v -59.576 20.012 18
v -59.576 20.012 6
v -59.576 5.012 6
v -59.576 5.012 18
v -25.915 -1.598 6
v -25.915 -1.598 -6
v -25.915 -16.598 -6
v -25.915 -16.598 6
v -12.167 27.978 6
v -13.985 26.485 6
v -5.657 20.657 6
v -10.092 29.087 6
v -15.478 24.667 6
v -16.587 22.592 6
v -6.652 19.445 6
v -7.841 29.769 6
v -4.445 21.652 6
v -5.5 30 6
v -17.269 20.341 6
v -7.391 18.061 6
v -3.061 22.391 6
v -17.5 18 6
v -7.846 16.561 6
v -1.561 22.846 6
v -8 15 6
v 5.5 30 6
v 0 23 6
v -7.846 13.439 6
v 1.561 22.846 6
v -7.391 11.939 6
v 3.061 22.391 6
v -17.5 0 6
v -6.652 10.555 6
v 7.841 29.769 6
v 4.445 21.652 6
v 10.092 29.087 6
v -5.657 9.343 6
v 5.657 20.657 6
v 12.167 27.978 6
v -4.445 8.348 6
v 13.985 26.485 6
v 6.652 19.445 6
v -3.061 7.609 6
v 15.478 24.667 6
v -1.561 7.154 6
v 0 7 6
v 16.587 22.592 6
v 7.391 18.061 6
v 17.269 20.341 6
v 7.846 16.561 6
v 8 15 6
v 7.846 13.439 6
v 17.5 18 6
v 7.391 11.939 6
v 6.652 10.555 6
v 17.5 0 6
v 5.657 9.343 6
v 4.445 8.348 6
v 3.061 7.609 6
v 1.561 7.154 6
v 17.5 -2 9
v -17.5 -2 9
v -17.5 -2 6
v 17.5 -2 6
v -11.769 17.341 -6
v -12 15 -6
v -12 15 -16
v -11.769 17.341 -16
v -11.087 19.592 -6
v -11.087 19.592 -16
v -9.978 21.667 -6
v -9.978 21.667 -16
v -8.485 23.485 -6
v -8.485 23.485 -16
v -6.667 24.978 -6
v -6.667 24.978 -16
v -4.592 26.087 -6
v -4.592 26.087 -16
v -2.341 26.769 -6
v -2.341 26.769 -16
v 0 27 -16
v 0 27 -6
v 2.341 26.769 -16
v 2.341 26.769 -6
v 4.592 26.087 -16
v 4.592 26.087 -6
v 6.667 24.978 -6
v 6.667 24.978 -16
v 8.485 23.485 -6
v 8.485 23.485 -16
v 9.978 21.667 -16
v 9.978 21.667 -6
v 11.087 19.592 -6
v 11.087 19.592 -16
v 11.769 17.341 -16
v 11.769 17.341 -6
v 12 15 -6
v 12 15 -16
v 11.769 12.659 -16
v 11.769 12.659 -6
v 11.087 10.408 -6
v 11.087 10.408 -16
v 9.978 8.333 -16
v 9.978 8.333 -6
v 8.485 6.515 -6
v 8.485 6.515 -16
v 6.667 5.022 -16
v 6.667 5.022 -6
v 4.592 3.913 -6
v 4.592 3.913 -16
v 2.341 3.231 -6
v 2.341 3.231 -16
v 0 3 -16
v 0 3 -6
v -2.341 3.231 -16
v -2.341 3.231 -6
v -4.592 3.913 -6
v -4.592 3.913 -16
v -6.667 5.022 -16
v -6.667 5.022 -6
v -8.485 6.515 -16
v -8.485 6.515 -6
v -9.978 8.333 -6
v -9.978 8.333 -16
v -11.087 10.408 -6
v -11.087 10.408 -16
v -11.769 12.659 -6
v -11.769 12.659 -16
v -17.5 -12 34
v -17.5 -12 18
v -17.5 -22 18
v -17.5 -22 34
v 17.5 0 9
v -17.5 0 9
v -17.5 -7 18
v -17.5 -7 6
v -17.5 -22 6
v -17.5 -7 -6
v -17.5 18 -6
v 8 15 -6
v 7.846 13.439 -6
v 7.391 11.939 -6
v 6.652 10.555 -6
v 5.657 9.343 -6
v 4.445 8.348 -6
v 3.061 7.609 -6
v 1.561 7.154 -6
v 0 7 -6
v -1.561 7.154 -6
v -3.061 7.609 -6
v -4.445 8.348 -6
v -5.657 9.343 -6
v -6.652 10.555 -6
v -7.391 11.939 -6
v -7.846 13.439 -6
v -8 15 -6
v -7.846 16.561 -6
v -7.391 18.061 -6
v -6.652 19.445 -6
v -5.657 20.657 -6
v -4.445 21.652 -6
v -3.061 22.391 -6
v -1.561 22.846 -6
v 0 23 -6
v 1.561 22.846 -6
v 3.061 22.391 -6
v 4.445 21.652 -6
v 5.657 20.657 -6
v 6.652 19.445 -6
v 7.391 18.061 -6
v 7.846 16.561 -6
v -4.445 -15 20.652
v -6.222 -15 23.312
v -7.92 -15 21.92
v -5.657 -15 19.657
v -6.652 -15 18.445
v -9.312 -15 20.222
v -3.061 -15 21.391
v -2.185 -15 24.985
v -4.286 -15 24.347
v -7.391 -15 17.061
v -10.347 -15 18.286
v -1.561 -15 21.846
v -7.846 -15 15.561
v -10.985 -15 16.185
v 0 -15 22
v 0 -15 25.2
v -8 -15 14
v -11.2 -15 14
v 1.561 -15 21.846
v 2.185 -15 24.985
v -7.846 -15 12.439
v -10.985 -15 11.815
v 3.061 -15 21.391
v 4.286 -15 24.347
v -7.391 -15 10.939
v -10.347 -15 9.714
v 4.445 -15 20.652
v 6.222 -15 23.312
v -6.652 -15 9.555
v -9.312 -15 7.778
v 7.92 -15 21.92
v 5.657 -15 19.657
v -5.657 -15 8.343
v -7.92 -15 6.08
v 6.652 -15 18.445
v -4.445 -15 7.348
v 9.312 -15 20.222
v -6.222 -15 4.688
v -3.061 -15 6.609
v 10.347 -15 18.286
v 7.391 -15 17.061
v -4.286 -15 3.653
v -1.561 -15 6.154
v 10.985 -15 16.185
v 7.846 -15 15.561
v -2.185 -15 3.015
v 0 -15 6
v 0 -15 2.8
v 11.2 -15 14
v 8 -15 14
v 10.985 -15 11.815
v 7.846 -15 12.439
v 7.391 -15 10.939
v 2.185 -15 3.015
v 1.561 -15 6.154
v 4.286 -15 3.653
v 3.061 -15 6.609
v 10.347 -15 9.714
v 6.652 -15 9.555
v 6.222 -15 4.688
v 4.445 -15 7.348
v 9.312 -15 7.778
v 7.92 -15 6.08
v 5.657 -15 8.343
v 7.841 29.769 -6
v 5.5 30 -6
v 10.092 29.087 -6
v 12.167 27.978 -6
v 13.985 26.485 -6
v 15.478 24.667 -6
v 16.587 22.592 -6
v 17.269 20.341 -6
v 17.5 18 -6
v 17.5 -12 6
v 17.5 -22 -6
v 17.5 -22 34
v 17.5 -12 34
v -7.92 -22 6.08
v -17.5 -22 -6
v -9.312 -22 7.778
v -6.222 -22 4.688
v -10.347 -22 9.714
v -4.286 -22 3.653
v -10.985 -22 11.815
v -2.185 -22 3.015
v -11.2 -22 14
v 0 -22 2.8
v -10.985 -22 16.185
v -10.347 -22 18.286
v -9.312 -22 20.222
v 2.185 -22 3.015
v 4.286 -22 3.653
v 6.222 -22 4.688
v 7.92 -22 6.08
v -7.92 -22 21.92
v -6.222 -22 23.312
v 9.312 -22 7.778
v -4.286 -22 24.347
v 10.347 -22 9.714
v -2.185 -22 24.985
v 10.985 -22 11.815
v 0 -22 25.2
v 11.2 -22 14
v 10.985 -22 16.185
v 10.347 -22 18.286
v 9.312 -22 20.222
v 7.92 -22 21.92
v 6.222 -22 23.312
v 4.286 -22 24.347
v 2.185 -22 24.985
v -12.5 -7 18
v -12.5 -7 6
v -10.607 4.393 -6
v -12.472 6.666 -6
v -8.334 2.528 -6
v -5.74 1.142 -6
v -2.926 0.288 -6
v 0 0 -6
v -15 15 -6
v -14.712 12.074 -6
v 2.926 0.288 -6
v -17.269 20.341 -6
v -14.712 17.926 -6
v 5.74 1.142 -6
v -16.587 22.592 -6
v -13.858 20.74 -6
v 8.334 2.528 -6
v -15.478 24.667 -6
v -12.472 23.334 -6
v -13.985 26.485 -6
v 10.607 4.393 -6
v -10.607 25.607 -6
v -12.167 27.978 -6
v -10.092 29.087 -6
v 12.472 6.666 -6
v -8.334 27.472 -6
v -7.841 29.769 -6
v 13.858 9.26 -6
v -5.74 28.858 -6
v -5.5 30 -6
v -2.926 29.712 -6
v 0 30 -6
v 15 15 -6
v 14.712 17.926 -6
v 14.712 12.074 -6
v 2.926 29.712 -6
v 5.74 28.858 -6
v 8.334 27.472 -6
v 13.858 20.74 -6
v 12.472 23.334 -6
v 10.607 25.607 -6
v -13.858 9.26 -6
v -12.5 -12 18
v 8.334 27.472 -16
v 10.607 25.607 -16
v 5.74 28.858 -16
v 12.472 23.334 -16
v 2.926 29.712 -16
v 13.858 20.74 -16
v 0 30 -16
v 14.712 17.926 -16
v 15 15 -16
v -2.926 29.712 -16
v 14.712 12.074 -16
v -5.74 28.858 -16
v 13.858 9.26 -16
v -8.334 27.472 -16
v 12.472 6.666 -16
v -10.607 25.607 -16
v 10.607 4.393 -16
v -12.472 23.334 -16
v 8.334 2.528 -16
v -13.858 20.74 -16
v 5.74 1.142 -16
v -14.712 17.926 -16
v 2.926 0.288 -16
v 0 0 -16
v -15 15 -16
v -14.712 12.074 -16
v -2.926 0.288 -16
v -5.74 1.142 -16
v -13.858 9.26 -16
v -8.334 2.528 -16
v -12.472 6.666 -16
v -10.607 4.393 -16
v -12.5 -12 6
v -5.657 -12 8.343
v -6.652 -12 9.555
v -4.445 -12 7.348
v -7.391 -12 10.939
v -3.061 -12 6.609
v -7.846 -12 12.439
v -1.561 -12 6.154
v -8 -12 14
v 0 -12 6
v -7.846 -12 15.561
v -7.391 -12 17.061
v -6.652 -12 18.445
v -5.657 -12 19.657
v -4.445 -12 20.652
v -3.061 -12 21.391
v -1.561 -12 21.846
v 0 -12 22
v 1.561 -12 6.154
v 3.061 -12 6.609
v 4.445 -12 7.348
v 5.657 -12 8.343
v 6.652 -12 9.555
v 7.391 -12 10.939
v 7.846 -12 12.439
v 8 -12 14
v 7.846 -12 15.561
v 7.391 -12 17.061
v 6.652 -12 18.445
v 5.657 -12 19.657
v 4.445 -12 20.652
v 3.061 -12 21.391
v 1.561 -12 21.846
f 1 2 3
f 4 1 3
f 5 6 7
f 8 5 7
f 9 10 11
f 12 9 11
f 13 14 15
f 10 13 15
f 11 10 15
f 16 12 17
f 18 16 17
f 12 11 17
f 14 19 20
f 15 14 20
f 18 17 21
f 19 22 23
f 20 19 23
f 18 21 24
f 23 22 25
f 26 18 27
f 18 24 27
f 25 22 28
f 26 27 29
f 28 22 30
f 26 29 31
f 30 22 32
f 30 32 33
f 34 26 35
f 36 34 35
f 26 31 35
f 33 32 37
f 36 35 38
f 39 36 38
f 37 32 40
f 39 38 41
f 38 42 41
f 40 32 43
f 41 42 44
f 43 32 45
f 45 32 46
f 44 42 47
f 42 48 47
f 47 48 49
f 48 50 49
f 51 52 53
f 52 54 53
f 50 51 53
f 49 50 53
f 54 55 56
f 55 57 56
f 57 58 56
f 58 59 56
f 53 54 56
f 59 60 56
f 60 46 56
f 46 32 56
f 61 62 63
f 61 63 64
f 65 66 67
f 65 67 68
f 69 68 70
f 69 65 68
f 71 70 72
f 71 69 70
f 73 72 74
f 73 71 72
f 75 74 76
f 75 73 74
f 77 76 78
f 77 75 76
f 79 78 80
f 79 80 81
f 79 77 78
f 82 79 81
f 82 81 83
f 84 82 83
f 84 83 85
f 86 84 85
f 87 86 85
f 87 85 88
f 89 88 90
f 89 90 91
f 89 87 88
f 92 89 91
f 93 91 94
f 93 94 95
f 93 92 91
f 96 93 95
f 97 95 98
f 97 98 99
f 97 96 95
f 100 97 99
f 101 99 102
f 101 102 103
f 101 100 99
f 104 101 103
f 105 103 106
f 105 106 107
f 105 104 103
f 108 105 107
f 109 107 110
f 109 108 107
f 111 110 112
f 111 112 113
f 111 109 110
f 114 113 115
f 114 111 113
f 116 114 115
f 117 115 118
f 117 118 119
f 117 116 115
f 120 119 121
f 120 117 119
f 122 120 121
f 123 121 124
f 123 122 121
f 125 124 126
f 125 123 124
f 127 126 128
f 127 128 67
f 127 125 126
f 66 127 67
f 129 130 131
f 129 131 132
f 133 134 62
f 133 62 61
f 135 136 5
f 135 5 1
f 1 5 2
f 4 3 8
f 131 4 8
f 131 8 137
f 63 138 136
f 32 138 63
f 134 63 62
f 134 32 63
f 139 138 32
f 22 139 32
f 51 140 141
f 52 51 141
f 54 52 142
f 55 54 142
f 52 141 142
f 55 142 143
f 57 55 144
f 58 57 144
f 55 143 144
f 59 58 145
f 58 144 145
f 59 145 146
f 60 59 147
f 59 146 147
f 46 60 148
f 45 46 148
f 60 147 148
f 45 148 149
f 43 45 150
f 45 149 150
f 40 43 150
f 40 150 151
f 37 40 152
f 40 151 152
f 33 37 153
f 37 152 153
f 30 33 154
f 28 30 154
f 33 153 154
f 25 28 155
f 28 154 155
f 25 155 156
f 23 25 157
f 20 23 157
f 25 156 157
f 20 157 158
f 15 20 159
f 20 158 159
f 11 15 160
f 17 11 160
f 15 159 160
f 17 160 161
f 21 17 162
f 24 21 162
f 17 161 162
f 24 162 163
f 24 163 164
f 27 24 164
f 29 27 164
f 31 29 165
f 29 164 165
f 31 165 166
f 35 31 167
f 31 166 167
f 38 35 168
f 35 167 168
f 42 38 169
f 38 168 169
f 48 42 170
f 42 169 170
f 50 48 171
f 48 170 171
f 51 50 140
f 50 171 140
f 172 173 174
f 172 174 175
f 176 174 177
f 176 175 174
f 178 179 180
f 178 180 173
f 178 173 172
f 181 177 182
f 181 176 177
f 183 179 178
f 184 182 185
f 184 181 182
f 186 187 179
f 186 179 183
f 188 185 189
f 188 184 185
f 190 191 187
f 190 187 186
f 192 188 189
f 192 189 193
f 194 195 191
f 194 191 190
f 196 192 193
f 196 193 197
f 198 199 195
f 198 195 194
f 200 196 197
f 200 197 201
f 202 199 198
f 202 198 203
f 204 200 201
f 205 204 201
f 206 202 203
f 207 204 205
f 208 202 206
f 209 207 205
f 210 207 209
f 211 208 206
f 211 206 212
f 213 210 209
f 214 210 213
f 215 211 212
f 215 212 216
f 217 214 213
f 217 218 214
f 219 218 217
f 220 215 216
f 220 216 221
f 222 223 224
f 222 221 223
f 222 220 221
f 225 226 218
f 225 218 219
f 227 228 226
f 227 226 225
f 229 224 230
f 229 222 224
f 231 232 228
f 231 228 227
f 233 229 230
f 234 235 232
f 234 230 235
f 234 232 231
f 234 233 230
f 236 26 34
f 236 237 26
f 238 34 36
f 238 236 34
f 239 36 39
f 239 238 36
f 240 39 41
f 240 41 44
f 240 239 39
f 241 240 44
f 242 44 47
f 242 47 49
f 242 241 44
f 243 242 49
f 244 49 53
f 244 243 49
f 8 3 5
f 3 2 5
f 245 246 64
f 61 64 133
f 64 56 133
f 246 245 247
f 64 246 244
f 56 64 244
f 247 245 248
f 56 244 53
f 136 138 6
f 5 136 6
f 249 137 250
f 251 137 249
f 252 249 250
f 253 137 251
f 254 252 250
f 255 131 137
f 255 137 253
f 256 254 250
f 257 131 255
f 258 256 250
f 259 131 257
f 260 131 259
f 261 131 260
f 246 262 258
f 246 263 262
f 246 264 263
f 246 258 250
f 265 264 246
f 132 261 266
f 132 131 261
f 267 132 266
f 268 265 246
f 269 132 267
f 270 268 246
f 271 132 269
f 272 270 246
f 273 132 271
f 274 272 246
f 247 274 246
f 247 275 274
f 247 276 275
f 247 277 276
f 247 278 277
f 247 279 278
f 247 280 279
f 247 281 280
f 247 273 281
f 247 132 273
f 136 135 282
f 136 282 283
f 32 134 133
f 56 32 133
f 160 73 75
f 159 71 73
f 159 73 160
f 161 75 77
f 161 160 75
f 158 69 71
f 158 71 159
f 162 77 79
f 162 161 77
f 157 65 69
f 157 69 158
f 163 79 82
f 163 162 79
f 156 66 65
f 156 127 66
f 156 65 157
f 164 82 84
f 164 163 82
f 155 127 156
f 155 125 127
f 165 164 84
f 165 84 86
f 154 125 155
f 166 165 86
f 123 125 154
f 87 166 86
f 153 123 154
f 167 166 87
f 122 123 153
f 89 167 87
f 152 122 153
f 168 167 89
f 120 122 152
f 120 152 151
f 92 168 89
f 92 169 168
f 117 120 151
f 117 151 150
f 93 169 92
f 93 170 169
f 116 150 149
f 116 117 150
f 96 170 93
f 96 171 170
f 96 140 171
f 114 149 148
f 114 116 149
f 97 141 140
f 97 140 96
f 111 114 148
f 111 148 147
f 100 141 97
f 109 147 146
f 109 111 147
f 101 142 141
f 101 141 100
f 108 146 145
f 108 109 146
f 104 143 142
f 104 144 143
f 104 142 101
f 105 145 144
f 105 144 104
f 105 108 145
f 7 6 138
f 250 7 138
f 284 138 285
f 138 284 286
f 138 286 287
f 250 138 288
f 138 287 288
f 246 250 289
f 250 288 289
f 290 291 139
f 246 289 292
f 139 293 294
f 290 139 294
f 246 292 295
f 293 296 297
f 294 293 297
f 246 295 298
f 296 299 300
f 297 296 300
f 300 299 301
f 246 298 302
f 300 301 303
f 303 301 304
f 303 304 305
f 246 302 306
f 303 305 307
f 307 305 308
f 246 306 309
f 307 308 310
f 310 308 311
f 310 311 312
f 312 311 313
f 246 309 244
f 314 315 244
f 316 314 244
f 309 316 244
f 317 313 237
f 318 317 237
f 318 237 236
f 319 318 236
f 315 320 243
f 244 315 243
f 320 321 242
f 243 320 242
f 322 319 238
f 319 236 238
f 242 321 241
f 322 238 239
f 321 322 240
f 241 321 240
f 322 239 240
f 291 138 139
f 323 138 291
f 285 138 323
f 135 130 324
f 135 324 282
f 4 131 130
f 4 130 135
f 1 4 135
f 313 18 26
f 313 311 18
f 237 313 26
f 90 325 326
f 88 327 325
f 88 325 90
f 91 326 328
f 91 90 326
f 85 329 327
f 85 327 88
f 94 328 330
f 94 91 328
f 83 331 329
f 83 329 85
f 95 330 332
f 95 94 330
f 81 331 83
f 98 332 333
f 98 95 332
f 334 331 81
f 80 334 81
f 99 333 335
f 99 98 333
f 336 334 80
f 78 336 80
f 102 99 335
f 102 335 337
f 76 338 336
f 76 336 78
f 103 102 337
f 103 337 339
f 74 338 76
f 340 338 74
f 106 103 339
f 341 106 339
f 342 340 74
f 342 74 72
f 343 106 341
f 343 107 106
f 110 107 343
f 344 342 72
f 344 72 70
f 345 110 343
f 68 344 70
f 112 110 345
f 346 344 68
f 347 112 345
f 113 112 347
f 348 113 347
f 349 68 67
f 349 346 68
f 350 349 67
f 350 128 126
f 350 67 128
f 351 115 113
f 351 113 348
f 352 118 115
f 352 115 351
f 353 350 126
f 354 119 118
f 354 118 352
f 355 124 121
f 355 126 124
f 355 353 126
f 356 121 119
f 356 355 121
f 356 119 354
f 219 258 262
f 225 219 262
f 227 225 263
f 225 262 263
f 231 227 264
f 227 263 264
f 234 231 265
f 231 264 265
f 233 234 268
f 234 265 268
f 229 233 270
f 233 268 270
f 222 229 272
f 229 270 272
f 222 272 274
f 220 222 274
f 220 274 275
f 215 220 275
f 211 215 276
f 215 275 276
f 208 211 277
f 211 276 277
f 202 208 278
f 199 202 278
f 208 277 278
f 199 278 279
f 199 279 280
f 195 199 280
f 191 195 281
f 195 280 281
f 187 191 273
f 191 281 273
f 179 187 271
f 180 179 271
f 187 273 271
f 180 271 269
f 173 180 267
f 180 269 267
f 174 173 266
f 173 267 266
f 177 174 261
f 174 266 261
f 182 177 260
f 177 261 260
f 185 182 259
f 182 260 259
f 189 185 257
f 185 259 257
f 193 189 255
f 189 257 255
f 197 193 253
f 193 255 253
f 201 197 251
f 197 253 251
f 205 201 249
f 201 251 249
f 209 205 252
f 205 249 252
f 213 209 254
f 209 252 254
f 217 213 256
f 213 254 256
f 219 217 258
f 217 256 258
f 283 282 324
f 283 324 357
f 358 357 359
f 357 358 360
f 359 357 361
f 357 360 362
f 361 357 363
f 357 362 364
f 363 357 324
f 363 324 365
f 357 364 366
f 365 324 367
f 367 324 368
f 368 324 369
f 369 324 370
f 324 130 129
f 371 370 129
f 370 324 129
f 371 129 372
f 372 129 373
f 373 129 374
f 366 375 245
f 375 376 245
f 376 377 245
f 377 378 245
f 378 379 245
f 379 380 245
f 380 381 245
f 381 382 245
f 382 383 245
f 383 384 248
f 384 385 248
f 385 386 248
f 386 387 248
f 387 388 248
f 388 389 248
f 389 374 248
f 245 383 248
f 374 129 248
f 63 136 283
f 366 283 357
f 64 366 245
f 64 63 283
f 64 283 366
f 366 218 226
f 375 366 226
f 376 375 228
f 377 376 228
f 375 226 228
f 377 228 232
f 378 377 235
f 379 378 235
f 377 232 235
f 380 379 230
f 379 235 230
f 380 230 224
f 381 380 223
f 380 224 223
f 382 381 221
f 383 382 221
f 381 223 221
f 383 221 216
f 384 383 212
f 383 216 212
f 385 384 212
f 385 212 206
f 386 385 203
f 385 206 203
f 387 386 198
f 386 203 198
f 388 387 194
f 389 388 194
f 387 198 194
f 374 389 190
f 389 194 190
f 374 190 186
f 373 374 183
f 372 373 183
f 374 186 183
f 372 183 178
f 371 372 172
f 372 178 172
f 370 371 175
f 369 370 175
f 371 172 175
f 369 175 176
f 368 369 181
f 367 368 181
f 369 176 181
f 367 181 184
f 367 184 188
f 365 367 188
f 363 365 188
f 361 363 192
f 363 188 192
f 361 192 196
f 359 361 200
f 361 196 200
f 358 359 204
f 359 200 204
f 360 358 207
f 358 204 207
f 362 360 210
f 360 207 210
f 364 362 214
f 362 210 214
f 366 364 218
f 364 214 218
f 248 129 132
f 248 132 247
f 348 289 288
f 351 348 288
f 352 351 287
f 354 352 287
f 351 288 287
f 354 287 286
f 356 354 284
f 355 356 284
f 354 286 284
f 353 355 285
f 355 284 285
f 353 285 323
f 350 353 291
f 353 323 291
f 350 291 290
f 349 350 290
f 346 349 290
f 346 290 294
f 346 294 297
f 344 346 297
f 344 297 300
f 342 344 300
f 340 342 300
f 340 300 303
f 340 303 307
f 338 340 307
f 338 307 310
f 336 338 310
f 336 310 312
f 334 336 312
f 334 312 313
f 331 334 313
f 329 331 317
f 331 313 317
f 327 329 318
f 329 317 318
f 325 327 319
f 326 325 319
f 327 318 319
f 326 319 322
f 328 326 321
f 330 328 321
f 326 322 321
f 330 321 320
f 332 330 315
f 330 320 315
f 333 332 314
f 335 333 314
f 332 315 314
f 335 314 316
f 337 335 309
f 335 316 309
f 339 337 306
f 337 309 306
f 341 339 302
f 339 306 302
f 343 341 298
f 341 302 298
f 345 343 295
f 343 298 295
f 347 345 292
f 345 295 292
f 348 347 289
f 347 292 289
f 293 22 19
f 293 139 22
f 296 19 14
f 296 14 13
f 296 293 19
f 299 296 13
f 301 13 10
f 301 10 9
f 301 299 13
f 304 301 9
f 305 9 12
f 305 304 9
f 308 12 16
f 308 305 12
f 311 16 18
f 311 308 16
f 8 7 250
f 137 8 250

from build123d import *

# Parameters (mm, degrees)
SKETCH1_W           = 35
SKETCH1_H           = 12
BOSS_EXTRUDE1_DEPTH = 20
SKETCH2_W           = 35
SKETCH2_H           = 12
BOSS_EXTRUDE2_DEPTH = 10
CUT_EXTRUDE1_DEPTH  = 12
FILLET1_R           = 12
SKETCH5_R           = 15
SKETCH5_R_2         = 12
BOSS_EXTRUDE3_DEPTH = 10
SKETCH6_W           = 35
SKETCH6_H           = 15
BOSS_EXTRUDE4_DEPTH = 2
SKETCH7_W           = 35
SKETCH7_H           = 12
BOSS_EXTRUDE5_DEPTH = 10
SKETCH8_W           = 35
SKETCH8_H           = 40
BOSS_EXTRUDE6_DEPTH = 10
SKETCH10_R          = 11.2
CUT_EXTRUDE2_DEPTH  = 7
SKETCH11_R          = 8
CUT_EXTRUDE3_DEPTH  = 3
BOSS_EXTRUDE7_DEPTH = 12
BOSS_EXTRUDE8_DEPTH = 12
SKETCH14_W          = 12
SKETCH14_H          = 5
BOSS_EXTRUDE9_DEPTH = 5


with BuildPart() as part:
    # Sketch1 → Boss-Extrude1 (new body)
    with BuildSketch(Plane(origin=(0, 0, 0), x_dir=(1, 0, 0), z_dir=(0, 1, 0))):
        Rectangle(SKETCH1_W, SKETCH1_H)
    extrude(amount=BOSS_EXTRUDE1_DEPTH)

    # Sketch2 → Boss-Extrude2 (add)
    with BuildSketch(Plane(origin=(0, 20, 0), x_dir=(1, 0, 0), z_dir=(0, 1, 0))):
        Rectangle(SKETCH2_W, SKETCH2_H)
    extrude(amount=BOSS_EXTRUDE2_DEPTH)

    # Sketch4 → Cut-Extrude1 (cut)
    with BuildSketch(Plane(origin=(0, 0, -6), x_dir=(-1, 0, 0), z_dir=(0, 0, -1))):
        with BuildLine():
            ThreePointArc((8, 15), (0, 23), (-8, 15))
            Line((-8, 15), (8, 15))
        make_face()
        with BuildLine():
            Line((8, 15), (-8, 15))
            ThreePointArc((-8, 15), (0, 7), (8, 15))
        make_face()
    extrude(amount=-CUT_EXTRUDE1_DEPTH, mode=Mode.SUBTRACT)

    # Fillet1
    fillet1_edges = [part.edges().sort_by_distance(p)[0] for p in [
        (-17.5, 30, 0),
        (17.5, 30, 0),
    ]]
    fillet(fillet1_edges, radius=FILLET1_R)

    # Sketch5 → Boss-Extrude3 (add)
    with BuildSketch(Plane(origin=(0, 0, -6), x_dir=(-1, 0, 0), z_dir=(0, 0, -1))):
        with Locations(Location((0, 15, 0), (0, 0, 270))):
            Circle(SKETCH5_R)
        with Locations((0, 15)):
            Circle(SKETCH5_R_2, mode=Mode.SUBTRACT)
    extrude(amount=BOSS_EXTRUDE3_DEPTH)

    # Sketch6 → Boss-Extrude4 (add)
    with BuildSketch(Plane.XZ):
        with Locations((0, 1.5)):
            Rectangle(SKETCH6_W, SKETCH6_H)
    extrude(amount=BOSS_EXTRUDE4_DEPTH)

    # Sketch7 → Boss-Extrude5 (add)
    with BuildSketch(Plane.XZ.offset(2)):
        Rectangle(SKETCH7_W, SKETCH7_H)
    extrude(amount=BOSS_EXTRUDE5_DEPTH)

    # Sketch8 → Boss-Extrude6 (add)
    with BuildSketch(Plane.XZ.offset(12)):
        with Locations((0, 14)):
            Rectangle(SKETCH8_W, SKETCH8_H)
    extrude(amount=BOSS_EXTRUDE6_DEPTH)

    # Sketch10 → Cut-Extrude2 (cut)
    with BuildSketch(Plane.XZ.offset(22)):
        with Locations(Location((0, 14, 0), (0, 0, 270))):
            Circle(SKETCH10_R)
    extrude(amount=-CUT_EXTRUDE2_DEPTH, mode=Mode.SUBTRACT)

    # Sketch11 → Cut-Extrude3 (cut)
    with BuildSketch(Plane.XZ.offset(15)):
        with Locations(Location((0, 14, 0), (0, 0, 270))):
            Circle(SKETCH11_R)
    extrude(amount=-CUT_EXTRUDE3_DEPTH, mode=Mode.SUBTRACT)

    # Sketch12 → Boss-Extrude7 (add)
    with BuildSketch(Plane(origin=(0, 0, -6), x_dir=(-1, 0, 0), z_dir=(0, 0, -1))):
        Polygon((17.5, -22), (17.5, -7), (25.915107819, -1.597596795), (25.915107819, -16.597596795), align=None)
    extrude(amount=-BOSS_EXTRUDE7_DEPTH)

    # Sketch13 → Boss-Extrude8 (add)
    with BuildSketch(Plane.XY.offset(6)):
        Polygon((-17.5, -22), (-17.5, -7), (-59.575539097, 20.012016024), (-59.575539097, 5.012016024), align=None)
    extrude(amount=BOSS_EXTRUDE8_DEPTH)

    # Sketch14 → Boss-Extrude9 (add)
    with BuildSketch(Plane(origin=(-17.5, 0, 0), x_dir=(0, 0, -1), z_dir=(1, 0, 0))):
        with Locations((-12, -9.5)):
            Rectangle(SKETCH14_W, SKETCH14_H)
    extrude(amount=BOSS_EXTRUDE9_DEPTH)


solid = part.part
